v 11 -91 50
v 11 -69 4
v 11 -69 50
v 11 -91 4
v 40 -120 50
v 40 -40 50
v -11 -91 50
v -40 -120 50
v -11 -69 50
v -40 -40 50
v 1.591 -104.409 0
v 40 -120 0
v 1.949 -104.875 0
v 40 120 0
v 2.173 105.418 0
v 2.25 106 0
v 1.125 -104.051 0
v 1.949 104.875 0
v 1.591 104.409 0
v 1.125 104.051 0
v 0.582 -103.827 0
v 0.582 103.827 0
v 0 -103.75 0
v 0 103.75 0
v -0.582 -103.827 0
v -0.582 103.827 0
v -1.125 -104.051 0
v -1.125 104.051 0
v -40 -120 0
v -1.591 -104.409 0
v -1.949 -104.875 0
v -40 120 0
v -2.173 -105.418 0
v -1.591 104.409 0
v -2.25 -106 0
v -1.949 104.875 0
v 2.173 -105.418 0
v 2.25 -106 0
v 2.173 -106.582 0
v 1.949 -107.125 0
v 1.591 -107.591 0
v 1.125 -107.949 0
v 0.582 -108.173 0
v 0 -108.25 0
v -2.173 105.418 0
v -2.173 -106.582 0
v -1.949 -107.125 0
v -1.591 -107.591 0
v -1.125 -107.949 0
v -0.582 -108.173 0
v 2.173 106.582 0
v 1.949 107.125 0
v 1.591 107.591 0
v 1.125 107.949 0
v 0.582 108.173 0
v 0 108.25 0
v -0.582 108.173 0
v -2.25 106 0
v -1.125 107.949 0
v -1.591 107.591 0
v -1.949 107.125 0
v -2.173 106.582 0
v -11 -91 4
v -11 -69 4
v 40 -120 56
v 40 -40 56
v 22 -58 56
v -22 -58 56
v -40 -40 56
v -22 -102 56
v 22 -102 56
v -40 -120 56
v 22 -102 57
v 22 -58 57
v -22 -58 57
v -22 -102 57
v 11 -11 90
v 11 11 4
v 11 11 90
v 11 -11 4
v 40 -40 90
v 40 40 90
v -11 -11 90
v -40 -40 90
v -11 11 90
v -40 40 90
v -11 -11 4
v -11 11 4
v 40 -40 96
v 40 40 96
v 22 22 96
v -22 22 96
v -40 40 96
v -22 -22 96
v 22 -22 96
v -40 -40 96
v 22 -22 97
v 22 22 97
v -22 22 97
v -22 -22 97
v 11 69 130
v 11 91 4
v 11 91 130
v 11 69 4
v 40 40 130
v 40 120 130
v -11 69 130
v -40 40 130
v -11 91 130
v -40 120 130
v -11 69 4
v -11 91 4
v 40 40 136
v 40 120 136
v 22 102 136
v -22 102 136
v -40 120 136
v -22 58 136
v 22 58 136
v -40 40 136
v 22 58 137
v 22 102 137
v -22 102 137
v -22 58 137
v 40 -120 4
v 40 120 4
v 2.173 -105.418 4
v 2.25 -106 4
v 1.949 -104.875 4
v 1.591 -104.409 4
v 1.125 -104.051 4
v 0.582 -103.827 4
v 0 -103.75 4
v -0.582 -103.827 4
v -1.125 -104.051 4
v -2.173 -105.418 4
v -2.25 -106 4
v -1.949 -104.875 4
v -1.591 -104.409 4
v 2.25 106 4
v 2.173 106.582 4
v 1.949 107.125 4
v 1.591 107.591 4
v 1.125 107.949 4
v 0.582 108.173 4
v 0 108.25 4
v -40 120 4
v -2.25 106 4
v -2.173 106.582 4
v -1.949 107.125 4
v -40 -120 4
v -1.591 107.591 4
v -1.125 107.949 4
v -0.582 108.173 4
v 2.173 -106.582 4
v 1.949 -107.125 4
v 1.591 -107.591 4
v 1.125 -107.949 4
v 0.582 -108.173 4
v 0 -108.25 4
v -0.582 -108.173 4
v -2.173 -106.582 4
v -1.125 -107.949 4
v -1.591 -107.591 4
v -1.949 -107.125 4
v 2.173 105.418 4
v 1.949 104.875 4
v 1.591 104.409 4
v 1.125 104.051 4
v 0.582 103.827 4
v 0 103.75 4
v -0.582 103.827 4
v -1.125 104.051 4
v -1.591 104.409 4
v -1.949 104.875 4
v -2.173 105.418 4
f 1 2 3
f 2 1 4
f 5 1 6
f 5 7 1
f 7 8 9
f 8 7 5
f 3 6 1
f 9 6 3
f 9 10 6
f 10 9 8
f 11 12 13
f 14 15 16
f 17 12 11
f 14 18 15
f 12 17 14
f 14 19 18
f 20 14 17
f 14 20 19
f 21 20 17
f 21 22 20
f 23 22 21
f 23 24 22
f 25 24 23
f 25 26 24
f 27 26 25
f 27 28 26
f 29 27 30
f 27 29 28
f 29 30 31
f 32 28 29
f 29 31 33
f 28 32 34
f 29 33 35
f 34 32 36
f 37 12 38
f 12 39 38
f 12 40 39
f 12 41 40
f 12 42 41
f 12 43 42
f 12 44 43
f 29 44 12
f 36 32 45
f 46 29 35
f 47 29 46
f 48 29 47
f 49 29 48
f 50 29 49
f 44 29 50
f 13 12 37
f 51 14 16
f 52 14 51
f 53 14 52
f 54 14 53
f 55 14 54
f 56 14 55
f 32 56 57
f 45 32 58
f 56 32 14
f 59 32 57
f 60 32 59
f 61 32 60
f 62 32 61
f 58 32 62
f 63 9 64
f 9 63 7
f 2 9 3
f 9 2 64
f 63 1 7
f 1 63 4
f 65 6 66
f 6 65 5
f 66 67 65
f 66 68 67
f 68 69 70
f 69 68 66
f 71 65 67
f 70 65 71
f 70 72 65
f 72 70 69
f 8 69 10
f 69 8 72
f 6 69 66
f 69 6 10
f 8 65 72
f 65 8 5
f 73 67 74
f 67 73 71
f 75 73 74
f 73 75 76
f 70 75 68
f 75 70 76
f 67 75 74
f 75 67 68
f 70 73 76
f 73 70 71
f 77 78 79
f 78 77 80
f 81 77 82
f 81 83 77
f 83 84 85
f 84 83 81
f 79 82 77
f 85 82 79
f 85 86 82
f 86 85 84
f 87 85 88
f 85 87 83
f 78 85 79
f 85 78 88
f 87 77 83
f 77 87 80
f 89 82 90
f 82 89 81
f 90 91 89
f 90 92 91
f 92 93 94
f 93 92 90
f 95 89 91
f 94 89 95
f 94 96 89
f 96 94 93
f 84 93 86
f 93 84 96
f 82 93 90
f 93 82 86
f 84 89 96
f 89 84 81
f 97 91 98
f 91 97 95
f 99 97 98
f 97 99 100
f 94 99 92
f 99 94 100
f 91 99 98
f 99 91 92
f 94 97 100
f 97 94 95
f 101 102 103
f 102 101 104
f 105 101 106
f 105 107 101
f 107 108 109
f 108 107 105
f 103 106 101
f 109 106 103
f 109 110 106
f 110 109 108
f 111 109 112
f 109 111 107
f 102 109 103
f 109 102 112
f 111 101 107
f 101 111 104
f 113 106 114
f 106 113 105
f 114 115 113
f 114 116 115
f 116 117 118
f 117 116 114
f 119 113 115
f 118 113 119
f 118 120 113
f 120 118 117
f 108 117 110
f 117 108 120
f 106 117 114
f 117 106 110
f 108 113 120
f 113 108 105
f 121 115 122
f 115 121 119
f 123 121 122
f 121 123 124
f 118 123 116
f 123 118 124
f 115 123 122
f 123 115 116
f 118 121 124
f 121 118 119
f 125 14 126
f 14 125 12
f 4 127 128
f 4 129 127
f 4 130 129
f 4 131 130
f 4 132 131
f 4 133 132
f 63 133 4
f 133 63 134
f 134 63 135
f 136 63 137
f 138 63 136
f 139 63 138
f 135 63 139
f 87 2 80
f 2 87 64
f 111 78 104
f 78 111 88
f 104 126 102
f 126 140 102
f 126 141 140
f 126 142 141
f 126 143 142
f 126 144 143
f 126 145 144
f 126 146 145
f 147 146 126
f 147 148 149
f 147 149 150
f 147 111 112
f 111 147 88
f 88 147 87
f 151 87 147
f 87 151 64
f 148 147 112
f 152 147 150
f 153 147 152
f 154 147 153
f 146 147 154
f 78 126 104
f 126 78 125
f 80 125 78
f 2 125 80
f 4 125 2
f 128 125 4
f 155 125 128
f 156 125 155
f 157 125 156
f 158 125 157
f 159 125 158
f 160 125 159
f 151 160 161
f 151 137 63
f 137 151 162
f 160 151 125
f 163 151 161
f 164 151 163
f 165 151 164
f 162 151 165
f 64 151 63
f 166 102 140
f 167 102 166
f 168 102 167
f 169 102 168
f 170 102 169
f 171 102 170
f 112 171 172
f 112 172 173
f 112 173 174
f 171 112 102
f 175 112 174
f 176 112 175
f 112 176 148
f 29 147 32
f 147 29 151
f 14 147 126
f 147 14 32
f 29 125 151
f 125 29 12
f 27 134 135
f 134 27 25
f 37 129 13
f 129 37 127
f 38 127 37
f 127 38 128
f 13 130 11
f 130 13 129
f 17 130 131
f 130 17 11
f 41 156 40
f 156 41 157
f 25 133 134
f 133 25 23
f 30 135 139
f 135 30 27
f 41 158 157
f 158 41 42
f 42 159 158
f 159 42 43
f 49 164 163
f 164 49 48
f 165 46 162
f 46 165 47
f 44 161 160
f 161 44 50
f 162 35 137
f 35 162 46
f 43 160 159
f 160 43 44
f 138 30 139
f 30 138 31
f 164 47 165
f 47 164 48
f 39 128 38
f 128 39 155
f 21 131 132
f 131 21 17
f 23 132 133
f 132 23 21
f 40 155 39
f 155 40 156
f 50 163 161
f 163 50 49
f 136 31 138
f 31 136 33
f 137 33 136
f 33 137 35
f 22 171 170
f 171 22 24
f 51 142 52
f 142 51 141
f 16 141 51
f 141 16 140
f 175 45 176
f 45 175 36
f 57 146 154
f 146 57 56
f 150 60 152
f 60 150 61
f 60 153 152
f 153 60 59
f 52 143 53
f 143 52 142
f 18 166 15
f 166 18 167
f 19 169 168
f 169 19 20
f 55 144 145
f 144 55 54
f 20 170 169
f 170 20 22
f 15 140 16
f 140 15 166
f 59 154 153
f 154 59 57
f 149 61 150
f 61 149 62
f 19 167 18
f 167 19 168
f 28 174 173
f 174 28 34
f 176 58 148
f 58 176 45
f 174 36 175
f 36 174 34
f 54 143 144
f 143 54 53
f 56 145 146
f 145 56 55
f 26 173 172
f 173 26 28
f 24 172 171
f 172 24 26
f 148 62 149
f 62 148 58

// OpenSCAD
pad_size=80; pad_heights=[50,90,130]; pad_thickness=6; mount_hole_diameter=4.5;
module landing_staircase(){ difference(){ union(){ translate([-40,-120,0]) cube([80,240,4]); for(i=[0:2]) { y=-80+i*80; translate([-11,y-11,0]) cube([22,22,pad_heights[i]]); translate([-40,y-40,pad_heights[i]]) cube([pad_size,pad_size,pad_thickness]); translate([-22,y-22,pad_heights[i]+pad_thickness]) cube([44,44,1]); } } for(y=[-106,106]) translate([0,y,-1]) cylinder(d=mount_hole_diameter,h=7,$fn=24); }}
assert(pad_size==80 && pad_heights[2]==130); echo("SCADCTL_REQUIREMENT:parameters:PASS"); landing_staircase();
